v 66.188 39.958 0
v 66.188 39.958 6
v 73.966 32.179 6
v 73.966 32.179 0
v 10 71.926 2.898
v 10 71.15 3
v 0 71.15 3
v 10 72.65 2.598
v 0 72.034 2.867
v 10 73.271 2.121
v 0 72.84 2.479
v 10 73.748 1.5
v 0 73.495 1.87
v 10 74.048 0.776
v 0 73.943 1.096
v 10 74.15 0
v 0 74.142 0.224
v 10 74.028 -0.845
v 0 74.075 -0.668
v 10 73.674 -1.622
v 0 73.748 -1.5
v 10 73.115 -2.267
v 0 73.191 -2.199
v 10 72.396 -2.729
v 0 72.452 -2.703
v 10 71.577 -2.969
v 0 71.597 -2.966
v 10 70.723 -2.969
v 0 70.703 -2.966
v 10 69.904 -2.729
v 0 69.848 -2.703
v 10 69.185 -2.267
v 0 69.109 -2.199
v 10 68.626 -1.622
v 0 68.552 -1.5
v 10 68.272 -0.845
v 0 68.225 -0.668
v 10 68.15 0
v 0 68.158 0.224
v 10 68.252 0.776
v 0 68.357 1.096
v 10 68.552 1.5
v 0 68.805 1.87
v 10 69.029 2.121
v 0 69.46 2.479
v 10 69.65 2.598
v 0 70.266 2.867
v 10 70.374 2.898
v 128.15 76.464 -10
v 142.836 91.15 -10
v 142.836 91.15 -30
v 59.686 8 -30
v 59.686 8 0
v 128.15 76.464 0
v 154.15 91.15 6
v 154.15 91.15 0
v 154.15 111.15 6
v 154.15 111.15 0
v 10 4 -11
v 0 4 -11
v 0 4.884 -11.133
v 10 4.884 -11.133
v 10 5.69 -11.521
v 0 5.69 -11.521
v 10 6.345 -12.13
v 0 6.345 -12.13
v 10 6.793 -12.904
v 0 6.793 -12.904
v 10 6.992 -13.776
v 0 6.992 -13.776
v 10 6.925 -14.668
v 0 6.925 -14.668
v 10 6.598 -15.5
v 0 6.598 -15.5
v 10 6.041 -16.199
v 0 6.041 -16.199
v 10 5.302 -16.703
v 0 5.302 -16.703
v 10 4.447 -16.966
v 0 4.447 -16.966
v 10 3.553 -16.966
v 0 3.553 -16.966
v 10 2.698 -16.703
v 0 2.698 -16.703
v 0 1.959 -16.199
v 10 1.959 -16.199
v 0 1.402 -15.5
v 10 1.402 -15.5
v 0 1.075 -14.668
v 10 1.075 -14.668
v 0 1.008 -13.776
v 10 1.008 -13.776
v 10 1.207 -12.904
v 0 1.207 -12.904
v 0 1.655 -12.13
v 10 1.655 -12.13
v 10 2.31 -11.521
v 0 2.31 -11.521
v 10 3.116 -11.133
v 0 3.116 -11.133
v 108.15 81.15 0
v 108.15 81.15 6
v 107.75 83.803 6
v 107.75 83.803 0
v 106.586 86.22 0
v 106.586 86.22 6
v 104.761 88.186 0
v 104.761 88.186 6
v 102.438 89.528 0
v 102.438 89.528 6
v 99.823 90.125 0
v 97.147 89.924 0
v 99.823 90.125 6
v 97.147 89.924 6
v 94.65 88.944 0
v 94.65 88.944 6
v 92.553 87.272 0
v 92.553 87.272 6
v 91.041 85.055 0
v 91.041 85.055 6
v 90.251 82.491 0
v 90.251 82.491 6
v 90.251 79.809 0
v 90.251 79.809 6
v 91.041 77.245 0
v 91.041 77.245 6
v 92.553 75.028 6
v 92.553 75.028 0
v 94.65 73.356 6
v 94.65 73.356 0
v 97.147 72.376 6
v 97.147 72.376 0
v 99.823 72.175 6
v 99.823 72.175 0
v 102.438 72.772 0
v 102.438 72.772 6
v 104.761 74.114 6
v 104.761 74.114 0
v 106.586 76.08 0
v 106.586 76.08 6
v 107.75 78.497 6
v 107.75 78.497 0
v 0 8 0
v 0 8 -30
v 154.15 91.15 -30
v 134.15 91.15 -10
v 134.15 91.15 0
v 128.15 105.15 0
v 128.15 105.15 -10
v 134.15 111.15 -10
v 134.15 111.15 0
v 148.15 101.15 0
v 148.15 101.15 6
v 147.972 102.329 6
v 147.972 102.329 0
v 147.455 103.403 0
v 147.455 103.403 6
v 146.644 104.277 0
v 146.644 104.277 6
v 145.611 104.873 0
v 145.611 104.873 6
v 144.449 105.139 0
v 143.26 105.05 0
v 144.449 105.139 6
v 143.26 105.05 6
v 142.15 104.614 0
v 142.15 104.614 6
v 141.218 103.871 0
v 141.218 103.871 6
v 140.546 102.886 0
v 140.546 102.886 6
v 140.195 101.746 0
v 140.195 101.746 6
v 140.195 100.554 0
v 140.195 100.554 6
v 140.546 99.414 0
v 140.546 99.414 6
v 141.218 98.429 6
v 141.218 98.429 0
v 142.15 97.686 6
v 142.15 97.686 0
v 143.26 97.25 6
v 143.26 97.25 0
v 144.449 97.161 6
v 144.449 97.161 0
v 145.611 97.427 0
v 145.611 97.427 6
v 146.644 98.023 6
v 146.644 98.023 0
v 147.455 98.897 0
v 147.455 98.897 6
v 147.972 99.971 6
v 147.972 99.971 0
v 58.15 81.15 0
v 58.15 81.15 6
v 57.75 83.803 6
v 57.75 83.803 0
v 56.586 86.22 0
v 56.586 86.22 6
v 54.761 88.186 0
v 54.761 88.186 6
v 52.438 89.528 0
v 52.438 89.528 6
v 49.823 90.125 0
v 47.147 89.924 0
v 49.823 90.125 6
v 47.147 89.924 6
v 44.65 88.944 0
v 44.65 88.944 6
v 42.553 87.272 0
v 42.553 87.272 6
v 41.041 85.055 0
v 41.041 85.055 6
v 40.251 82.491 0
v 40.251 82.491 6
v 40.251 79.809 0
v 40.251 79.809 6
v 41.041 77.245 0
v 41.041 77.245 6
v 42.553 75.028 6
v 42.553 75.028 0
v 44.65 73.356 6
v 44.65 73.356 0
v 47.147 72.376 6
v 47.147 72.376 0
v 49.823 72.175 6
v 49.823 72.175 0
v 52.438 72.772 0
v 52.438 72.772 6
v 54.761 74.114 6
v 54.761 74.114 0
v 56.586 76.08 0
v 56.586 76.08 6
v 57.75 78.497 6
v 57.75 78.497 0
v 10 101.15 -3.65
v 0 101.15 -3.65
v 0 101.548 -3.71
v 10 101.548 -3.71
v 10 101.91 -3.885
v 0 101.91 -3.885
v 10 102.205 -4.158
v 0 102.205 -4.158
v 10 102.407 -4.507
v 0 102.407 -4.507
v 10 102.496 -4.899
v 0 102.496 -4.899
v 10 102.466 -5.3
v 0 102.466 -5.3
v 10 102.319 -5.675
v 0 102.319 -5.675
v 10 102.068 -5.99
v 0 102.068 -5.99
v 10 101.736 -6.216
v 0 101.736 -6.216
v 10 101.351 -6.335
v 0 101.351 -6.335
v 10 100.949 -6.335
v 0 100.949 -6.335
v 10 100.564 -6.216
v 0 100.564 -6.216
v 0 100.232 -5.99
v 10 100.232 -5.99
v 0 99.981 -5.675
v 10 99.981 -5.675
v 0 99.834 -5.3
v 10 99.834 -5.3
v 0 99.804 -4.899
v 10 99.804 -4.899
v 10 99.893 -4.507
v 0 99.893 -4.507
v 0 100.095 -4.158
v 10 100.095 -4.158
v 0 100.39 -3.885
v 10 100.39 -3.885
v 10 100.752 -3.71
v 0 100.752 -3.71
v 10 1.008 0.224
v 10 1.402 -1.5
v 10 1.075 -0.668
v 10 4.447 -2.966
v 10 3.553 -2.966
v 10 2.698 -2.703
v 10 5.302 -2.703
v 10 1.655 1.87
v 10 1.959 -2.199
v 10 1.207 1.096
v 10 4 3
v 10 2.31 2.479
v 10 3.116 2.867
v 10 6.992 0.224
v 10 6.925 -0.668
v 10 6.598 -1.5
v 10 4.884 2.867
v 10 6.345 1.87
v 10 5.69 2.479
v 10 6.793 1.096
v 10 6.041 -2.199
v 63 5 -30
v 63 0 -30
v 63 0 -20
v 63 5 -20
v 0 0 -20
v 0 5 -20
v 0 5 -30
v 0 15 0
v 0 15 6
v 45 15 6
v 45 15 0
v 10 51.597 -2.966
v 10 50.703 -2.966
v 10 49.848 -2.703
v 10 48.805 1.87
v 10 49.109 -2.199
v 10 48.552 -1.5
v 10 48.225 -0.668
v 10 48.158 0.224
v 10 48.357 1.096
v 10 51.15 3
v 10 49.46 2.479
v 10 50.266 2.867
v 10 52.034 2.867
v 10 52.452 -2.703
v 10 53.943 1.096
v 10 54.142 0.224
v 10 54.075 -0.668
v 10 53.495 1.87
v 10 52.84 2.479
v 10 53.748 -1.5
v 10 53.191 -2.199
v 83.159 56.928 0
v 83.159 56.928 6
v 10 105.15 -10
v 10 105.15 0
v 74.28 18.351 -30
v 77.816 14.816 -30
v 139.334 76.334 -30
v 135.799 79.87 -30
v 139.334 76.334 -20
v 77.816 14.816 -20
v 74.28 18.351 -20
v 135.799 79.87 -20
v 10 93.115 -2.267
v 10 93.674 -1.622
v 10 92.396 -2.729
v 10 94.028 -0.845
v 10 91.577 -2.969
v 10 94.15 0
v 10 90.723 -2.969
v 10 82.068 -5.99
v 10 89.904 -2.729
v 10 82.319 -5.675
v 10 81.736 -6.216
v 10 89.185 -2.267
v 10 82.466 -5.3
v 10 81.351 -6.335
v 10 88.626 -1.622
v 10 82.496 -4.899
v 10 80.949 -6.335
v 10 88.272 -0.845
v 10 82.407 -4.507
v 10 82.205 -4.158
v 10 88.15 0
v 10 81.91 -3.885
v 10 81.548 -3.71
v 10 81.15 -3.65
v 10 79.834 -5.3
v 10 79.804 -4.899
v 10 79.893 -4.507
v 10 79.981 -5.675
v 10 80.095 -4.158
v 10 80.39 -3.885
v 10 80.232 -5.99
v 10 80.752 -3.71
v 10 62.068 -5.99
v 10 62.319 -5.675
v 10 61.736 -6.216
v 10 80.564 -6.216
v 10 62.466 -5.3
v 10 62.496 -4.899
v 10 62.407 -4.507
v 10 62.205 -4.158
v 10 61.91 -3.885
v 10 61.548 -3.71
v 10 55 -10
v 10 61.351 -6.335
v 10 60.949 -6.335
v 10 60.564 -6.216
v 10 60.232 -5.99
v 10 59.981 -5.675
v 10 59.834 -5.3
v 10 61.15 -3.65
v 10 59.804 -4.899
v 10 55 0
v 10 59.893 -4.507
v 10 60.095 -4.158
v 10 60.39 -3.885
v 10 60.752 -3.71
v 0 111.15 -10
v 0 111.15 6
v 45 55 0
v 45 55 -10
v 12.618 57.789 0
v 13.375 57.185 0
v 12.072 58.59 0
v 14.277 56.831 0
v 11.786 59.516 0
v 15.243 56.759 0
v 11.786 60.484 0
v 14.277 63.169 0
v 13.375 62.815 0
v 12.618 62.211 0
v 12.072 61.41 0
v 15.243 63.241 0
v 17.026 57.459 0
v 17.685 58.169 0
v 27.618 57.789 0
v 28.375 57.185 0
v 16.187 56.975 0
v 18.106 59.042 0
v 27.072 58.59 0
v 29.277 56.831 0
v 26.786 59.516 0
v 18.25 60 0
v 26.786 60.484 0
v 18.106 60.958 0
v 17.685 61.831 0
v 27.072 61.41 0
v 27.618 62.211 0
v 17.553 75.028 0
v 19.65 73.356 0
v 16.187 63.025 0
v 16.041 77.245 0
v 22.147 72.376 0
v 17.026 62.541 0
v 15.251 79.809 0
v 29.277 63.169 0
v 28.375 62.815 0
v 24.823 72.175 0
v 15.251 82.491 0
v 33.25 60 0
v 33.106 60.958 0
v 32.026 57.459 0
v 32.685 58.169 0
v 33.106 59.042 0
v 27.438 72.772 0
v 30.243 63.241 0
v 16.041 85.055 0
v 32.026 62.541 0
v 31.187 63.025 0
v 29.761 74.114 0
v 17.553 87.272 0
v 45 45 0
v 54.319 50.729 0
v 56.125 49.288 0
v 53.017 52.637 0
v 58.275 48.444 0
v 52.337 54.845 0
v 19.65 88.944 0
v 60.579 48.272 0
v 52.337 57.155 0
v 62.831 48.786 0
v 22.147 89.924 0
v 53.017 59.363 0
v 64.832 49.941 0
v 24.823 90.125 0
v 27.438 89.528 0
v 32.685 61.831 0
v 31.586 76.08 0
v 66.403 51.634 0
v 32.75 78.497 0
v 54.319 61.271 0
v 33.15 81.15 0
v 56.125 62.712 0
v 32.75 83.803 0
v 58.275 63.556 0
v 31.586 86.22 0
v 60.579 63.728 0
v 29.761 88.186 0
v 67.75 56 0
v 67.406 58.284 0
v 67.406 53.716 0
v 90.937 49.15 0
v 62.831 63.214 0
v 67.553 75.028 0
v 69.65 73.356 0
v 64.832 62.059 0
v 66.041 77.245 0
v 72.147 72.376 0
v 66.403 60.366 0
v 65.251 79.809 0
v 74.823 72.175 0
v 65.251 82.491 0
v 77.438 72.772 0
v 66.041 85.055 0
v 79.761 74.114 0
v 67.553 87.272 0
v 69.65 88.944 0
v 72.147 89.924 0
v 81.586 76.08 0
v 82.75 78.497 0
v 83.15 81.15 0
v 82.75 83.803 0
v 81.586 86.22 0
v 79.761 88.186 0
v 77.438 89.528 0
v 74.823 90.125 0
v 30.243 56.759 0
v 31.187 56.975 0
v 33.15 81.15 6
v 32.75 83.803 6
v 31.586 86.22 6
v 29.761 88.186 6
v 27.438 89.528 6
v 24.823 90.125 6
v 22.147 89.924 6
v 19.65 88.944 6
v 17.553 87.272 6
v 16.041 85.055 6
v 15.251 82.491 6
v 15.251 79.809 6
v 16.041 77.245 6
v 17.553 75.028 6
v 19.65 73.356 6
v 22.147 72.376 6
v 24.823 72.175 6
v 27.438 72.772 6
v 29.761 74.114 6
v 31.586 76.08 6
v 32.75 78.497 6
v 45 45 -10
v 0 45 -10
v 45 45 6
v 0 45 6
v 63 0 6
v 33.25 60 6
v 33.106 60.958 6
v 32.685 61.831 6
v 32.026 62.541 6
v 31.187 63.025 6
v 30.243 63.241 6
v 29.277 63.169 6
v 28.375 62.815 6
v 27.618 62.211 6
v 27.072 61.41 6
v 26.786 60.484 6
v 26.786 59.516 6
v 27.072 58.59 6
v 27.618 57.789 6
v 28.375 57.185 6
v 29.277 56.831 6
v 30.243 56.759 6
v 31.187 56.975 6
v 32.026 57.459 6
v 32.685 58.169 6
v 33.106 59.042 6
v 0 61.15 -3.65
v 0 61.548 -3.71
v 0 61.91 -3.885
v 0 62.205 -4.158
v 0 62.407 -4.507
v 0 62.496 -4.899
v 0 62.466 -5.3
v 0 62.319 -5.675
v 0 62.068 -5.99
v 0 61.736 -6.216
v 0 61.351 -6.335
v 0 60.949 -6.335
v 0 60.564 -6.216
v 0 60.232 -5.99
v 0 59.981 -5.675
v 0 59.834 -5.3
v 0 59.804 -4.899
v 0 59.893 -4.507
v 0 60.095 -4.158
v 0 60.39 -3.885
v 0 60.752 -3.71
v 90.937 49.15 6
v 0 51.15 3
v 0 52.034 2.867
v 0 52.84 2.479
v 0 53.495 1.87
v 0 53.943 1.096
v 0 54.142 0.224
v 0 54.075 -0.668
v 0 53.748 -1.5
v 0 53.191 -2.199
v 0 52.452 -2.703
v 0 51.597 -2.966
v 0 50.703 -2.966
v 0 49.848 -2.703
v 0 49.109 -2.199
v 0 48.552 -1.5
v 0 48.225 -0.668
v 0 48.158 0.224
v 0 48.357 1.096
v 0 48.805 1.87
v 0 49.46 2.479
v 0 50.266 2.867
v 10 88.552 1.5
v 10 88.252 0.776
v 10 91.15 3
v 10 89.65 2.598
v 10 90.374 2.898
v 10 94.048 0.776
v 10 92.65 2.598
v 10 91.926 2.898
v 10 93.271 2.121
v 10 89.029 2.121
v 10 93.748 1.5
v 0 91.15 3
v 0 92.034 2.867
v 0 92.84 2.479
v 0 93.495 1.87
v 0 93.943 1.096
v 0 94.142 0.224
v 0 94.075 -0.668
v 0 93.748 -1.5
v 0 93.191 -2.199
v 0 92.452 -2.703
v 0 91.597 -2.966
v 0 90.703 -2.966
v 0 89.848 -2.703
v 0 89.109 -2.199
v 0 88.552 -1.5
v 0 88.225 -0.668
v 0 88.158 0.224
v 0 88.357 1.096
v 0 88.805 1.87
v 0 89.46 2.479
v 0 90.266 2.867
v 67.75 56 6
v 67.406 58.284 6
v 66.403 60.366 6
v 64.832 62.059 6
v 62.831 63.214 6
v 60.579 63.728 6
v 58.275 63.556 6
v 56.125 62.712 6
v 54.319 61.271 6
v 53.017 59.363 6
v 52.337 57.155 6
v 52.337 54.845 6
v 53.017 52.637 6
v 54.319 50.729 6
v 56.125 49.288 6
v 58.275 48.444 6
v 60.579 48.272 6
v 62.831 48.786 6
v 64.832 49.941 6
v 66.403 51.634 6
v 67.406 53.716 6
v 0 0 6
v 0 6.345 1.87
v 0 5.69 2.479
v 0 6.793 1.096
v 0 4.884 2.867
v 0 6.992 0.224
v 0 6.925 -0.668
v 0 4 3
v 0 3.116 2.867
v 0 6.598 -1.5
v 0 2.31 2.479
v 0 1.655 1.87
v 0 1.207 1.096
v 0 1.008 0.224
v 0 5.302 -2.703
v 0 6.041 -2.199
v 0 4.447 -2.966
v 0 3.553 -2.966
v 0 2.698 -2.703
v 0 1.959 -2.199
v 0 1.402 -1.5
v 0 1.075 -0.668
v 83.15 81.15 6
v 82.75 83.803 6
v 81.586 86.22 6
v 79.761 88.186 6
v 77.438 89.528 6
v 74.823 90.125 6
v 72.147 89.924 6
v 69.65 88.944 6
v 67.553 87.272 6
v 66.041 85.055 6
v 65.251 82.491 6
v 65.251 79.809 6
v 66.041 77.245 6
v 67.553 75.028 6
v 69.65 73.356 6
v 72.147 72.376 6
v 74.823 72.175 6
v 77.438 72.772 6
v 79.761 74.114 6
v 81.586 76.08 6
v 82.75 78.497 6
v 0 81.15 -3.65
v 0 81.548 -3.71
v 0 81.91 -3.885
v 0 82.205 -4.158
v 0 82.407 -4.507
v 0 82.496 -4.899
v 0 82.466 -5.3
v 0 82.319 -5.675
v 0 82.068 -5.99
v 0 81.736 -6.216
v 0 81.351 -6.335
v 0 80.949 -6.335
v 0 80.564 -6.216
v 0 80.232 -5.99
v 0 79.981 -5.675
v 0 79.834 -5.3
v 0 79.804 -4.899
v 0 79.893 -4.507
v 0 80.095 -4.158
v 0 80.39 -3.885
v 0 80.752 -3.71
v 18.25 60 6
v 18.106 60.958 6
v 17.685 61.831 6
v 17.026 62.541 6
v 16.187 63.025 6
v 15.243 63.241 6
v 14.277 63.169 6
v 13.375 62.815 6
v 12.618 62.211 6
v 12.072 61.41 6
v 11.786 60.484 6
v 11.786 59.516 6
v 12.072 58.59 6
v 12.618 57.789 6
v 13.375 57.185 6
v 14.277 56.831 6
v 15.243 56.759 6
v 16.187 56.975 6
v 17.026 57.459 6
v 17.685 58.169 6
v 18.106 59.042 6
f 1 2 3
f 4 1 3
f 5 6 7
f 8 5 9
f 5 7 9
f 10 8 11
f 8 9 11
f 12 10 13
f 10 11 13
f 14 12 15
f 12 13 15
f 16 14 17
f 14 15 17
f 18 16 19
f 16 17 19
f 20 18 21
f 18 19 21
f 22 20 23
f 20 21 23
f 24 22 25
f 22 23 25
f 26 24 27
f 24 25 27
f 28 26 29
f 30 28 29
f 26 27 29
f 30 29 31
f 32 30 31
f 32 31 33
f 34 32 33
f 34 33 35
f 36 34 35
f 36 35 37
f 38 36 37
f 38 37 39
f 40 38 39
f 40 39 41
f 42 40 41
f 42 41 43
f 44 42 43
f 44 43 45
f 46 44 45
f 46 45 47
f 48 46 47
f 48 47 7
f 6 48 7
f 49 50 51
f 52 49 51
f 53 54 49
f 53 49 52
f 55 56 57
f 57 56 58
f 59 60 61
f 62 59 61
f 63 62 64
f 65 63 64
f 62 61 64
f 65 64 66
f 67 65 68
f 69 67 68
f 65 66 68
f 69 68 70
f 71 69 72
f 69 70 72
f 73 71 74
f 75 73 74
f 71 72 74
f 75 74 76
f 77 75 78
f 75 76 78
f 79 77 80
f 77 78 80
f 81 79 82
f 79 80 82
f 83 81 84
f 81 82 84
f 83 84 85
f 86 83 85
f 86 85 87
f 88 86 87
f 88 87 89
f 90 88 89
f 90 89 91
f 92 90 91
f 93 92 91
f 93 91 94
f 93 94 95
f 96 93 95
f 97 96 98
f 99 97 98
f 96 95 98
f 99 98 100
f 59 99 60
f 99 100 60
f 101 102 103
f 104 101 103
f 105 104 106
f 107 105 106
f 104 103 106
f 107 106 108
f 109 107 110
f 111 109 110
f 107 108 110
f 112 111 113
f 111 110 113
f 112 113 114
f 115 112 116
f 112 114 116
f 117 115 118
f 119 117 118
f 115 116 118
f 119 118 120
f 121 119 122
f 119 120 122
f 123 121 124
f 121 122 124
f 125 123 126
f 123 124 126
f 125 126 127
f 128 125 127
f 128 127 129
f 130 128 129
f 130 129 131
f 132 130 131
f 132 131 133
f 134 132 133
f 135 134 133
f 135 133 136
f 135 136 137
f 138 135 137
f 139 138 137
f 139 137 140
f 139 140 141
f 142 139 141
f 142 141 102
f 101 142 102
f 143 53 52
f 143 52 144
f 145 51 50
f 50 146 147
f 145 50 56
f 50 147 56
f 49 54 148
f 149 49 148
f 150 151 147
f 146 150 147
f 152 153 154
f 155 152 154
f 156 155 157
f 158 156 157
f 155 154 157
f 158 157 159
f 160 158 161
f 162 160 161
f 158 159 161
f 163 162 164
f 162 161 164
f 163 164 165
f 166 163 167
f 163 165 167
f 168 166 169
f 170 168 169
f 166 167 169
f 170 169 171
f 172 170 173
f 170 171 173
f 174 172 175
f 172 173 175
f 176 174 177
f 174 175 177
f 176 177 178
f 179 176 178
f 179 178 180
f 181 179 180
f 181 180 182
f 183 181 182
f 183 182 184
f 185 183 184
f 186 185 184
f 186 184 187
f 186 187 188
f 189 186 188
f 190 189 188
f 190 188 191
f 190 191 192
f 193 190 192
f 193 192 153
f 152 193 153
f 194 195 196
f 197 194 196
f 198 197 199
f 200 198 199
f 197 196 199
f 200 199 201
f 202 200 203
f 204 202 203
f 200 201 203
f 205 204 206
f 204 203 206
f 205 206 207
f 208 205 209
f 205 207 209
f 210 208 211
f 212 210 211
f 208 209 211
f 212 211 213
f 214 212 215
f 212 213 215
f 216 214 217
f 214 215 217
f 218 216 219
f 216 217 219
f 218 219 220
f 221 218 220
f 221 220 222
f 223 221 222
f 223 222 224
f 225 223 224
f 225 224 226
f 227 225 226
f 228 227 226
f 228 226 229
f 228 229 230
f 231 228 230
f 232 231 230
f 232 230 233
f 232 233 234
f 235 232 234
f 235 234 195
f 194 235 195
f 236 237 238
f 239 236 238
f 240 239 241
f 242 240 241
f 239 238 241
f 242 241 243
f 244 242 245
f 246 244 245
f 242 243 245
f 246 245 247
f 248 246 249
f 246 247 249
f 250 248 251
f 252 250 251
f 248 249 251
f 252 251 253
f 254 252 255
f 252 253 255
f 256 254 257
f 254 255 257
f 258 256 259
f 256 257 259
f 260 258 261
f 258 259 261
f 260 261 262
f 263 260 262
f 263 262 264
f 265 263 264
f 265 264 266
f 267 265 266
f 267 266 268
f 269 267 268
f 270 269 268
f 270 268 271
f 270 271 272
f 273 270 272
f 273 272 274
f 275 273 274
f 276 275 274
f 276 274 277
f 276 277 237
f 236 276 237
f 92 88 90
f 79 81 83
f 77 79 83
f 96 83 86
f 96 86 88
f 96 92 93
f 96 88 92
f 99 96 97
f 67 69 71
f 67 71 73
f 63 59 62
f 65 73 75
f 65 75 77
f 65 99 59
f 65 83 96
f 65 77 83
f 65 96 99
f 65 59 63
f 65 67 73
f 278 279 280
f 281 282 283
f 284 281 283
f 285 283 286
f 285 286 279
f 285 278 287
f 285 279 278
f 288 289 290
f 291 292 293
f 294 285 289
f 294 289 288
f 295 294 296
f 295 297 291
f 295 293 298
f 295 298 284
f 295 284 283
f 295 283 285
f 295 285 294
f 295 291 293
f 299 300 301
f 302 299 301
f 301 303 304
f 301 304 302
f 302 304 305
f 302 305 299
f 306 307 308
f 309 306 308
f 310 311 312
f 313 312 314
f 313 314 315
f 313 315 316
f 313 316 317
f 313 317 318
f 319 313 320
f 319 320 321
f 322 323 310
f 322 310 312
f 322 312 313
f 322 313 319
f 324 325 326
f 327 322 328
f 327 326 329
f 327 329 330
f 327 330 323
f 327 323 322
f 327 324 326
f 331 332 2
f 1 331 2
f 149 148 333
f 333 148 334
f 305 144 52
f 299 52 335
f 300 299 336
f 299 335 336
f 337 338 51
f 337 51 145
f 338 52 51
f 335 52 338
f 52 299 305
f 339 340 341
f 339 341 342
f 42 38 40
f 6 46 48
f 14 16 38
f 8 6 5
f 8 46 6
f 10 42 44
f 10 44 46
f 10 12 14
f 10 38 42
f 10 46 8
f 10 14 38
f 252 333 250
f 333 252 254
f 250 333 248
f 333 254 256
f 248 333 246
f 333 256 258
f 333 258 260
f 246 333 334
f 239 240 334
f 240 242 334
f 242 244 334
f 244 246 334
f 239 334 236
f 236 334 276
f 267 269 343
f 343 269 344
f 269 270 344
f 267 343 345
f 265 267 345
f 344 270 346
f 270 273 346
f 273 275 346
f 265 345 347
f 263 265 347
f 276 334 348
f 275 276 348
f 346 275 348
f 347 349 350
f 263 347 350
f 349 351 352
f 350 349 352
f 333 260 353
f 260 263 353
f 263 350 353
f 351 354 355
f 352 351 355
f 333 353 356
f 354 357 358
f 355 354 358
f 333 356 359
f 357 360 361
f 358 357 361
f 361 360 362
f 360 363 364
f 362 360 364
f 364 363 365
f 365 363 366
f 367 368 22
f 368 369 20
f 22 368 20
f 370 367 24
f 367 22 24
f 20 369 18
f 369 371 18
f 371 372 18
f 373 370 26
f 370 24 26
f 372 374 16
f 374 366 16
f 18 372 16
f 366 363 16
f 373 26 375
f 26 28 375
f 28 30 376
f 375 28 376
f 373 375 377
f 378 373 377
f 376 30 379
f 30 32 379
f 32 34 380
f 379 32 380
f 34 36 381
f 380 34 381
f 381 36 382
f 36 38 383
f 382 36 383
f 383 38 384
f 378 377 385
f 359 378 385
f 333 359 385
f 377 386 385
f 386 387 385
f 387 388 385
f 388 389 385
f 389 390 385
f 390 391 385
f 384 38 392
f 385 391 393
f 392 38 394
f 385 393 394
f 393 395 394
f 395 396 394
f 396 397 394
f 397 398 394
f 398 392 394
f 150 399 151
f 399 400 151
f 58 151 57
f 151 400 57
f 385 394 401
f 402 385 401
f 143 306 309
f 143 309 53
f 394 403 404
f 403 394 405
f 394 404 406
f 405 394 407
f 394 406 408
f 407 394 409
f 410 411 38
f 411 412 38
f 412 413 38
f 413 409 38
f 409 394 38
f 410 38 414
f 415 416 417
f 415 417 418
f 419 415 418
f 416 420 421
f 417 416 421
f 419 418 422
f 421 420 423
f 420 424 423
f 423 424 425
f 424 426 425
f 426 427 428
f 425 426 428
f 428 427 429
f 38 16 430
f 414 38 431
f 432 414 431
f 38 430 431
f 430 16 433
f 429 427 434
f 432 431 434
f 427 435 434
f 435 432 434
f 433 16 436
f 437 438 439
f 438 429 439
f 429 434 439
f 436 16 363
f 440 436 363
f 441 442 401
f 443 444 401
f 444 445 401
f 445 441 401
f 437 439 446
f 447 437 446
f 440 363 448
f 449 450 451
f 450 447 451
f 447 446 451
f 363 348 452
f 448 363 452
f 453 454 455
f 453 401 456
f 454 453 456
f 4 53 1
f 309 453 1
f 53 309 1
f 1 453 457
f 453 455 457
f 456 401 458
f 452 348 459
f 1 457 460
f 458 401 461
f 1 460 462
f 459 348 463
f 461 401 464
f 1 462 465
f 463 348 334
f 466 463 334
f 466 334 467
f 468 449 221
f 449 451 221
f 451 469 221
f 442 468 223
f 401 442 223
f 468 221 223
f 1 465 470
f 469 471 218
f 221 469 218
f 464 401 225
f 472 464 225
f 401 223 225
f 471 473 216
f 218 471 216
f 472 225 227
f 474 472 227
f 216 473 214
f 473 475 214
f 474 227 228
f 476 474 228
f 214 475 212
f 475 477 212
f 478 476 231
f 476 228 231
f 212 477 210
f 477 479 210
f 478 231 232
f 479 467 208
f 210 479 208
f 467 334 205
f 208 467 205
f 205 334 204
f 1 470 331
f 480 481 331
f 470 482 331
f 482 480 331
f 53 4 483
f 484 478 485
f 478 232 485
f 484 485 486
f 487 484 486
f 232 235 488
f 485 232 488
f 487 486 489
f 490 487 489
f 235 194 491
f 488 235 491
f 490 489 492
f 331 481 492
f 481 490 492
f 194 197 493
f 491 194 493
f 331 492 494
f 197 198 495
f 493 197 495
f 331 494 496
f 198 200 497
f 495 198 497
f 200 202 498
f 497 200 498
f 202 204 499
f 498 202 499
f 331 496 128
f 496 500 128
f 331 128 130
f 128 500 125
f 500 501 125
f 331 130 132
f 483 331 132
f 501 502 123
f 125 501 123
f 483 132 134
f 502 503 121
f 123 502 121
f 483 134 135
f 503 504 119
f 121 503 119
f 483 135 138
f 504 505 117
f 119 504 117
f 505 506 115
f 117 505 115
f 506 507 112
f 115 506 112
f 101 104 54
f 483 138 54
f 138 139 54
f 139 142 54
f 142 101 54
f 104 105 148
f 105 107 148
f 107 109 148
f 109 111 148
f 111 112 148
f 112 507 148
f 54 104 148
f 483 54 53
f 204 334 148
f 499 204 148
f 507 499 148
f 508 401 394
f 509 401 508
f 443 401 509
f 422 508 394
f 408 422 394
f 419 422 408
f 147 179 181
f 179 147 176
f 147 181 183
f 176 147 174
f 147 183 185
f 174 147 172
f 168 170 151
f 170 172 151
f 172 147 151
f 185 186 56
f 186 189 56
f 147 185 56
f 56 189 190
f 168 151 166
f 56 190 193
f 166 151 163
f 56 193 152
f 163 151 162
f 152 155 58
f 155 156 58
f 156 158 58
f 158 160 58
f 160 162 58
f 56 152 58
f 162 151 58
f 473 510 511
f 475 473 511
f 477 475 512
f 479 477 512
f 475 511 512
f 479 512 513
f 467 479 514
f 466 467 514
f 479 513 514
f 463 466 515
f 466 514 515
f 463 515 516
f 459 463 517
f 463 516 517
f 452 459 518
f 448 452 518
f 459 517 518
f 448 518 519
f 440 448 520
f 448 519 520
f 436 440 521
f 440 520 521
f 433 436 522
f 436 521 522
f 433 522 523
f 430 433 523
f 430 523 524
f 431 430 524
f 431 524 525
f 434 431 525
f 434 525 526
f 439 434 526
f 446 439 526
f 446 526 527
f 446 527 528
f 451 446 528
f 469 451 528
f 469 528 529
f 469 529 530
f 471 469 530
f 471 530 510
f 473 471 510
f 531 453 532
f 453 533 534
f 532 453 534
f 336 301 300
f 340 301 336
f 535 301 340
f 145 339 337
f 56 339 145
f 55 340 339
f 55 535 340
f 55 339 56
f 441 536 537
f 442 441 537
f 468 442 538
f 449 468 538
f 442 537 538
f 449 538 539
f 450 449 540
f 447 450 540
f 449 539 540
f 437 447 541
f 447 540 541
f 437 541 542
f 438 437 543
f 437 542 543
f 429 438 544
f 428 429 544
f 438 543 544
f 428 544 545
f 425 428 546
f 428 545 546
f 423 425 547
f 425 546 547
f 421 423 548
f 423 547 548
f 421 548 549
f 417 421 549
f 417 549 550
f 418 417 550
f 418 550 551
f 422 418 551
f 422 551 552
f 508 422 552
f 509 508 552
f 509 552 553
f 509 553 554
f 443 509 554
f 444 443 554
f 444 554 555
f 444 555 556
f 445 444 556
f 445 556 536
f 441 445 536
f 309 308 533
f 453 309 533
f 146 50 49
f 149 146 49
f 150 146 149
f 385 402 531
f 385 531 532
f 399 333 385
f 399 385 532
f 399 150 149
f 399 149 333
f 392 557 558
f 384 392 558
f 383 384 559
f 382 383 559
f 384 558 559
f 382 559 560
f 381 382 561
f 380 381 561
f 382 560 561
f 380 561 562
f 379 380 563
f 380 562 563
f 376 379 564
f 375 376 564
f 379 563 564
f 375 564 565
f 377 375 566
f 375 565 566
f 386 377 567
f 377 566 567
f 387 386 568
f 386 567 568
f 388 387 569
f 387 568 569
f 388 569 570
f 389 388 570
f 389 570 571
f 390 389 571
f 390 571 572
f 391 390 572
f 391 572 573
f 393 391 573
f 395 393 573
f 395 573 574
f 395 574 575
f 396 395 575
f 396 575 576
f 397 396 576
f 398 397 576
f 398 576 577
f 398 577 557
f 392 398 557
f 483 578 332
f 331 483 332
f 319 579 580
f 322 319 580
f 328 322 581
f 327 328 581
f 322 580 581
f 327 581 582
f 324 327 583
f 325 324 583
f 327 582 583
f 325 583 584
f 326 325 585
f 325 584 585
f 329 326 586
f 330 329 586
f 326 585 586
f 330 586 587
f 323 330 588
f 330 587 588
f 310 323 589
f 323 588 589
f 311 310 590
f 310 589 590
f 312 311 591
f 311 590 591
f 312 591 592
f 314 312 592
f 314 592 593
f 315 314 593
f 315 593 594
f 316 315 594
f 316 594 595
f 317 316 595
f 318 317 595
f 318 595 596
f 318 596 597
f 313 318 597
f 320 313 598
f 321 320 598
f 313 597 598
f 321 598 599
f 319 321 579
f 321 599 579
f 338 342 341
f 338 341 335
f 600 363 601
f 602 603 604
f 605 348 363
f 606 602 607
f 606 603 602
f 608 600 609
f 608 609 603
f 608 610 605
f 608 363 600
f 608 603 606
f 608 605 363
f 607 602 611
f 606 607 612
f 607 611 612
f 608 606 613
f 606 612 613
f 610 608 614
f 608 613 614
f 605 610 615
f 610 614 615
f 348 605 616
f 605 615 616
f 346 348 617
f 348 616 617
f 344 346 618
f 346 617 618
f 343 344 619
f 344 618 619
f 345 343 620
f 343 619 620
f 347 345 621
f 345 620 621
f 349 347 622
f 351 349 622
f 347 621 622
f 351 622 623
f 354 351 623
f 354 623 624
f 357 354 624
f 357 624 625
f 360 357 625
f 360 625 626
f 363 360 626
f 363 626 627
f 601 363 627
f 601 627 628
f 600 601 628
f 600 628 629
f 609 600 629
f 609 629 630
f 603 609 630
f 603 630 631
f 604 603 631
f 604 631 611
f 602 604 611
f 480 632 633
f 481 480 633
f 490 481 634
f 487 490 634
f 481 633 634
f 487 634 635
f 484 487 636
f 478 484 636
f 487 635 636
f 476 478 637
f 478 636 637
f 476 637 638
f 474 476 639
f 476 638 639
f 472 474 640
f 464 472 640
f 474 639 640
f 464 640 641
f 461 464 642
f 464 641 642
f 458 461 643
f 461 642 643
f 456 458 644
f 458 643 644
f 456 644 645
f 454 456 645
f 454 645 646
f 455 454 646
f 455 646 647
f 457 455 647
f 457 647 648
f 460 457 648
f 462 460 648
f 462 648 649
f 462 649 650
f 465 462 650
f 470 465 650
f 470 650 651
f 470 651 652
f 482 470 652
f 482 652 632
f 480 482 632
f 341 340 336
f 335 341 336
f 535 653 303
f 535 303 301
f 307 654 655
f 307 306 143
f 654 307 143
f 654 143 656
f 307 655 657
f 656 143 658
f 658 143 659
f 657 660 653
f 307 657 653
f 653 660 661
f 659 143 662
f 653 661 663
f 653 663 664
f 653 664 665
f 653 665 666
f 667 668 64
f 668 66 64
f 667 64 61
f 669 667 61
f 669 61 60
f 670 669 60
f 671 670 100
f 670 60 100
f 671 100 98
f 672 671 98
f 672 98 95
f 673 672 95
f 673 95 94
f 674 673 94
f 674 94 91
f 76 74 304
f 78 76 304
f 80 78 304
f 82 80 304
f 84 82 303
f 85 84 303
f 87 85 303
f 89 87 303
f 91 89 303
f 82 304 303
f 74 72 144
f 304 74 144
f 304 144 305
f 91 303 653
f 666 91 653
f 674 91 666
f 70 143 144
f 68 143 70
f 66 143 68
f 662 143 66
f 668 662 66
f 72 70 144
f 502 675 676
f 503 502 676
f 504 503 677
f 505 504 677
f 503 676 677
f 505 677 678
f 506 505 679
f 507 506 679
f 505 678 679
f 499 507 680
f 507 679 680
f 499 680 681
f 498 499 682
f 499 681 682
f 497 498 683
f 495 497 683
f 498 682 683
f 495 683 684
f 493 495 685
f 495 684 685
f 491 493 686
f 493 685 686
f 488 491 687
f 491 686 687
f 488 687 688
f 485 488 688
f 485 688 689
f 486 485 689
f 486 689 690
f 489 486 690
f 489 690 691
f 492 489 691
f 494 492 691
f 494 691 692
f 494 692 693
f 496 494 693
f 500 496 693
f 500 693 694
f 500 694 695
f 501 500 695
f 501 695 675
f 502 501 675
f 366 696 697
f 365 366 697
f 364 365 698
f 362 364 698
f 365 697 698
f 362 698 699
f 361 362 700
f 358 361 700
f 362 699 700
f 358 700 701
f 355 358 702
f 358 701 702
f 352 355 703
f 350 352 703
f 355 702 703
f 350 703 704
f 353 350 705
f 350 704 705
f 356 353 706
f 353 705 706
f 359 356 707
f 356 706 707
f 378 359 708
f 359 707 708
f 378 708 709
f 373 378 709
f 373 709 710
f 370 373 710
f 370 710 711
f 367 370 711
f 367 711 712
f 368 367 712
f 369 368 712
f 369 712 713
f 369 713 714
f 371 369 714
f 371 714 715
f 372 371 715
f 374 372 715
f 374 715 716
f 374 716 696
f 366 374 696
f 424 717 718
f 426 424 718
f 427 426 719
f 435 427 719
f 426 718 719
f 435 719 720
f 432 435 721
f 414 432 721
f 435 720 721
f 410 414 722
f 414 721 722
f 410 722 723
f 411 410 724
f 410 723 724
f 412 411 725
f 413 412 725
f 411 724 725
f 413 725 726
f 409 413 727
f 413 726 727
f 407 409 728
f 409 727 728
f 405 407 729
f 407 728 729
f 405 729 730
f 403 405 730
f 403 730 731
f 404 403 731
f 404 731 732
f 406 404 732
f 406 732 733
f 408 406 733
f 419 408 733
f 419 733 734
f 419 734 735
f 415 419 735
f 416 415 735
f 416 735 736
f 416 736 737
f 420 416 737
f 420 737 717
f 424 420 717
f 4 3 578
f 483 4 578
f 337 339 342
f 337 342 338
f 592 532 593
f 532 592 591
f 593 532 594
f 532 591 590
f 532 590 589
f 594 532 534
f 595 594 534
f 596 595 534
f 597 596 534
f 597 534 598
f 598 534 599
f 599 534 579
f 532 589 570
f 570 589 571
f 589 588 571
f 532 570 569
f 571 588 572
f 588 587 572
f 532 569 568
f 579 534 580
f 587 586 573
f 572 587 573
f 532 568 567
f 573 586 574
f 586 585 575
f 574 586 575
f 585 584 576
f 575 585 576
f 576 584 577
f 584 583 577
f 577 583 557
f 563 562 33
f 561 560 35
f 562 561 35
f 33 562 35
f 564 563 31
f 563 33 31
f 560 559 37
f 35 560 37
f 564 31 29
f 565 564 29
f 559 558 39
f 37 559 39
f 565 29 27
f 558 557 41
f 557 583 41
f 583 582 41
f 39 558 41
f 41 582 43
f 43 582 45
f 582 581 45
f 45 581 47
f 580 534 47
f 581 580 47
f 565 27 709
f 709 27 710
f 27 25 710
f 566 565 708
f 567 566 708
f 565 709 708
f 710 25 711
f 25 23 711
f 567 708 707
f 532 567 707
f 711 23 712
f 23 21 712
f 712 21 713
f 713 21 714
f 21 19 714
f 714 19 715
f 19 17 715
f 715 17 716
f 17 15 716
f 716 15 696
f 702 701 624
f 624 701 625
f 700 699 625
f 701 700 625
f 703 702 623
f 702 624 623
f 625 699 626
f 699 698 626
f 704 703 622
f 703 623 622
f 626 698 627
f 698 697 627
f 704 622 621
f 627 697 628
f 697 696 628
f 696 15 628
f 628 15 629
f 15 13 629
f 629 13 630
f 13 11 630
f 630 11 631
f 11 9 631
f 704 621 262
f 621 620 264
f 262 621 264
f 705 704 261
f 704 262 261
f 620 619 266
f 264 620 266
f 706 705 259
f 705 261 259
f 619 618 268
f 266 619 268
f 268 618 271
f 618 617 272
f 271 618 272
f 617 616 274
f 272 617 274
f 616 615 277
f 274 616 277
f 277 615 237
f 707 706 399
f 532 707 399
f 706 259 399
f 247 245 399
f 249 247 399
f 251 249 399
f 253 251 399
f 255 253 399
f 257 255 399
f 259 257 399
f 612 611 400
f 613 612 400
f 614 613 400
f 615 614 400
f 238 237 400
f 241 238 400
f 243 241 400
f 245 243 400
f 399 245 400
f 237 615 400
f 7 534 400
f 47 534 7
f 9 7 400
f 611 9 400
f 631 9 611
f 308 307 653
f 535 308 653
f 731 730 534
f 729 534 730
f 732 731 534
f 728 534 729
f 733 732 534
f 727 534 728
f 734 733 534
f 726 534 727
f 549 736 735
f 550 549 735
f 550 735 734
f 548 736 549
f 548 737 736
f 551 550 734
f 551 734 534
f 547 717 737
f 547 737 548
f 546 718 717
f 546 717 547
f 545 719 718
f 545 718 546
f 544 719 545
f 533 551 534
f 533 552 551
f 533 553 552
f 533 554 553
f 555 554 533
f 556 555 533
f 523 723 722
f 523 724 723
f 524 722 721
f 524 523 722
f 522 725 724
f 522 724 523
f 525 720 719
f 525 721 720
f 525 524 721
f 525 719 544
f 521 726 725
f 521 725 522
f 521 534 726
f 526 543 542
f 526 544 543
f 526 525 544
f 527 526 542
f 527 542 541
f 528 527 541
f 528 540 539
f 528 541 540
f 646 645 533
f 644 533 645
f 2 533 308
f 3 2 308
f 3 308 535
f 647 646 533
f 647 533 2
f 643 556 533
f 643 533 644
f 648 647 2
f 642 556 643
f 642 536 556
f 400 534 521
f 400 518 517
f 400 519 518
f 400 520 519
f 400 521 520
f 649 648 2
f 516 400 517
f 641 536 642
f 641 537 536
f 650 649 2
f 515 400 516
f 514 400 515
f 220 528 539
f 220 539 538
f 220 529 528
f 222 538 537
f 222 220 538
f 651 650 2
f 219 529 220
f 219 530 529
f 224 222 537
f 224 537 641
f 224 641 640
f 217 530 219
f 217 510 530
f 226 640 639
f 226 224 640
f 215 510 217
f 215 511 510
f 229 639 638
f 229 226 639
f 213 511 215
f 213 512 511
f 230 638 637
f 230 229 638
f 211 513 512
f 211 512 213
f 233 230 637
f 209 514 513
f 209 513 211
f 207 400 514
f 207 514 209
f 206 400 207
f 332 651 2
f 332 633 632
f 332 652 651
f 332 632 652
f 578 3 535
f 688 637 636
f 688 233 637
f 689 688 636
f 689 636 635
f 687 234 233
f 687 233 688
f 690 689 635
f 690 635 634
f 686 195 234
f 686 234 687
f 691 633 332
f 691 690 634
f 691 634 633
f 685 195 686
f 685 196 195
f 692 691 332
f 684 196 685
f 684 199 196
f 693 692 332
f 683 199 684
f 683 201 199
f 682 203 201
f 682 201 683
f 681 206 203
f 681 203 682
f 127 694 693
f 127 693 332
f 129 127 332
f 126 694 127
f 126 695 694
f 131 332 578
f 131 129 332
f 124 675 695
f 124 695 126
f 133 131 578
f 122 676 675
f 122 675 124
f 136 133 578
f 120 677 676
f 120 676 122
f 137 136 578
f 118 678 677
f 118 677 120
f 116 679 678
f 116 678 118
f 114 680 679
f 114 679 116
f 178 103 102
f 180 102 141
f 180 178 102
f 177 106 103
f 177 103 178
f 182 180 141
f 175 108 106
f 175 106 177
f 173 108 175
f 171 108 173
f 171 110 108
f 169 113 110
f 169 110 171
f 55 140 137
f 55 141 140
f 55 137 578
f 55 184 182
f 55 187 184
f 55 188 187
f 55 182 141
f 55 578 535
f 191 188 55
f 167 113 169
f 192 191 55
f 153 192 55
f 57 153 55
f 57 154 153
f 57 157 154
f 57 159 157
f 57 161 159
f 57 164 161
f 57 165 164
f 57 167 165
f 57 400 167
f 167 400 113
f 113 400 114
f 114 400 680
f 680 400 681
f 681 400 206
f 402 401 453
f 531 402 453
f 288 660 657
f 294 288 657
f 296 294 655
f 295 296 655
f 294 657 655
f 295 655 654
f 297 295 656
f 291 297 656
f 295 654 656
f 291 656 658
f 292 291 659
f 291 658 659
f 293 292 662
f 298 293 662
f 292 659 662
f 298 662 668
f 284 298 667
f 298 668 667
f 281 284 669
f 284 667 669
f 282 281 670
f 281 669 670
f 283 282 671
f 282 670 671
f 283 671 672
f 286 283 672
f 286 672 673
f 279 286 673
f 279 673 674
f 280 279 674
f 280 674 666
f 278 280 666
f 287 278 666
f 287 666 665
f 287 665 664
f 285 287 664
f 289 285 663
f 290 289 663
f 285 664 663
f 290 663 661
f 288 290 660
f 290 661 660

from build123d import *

# Parameters (mm, degrees)
BOSS_EXTRU_1_DEPTH         = 6
ESQUISSE2_R                = 9
ESQUISSE2_R_2              = 7.75
ESQUISSE2_R_3              = 3.25
ENL_V_MAT_EXTRU_1_DEPTH    = 191.138226036
ESQUISSE3_W                = 45
ESQUISSE3_H                = 30
ENL_V_MAT_EXTRU_2_DEPTH    = 191.138226036
BOSS_EXTRU_2_DEPTH         = 30
BOSS_EXTRU_3_DEPTH         = 10
ESQUISSE8_R                = 4
ENL_V_MAT_EXTRU_3_DEPTH    = 194.423227664
ENL_V_MAT_EXTRU_4_REACH    = 194.397
ESQUISSE9_R                = 1.35
R_P_TITION_LIN_AIRE1_COUNT = 3
R_P_TITION_LIN_AIRE1_PITCH = 20
ESQUISSE10_R               = 3
ENL_V_MAT_EXTRU_5_DEPTH    = 10
ESQUISSE11_W               = 63
ESQUISSE11_H               = 10
ENL_V_MAT_EXTRU_6_DEPTH    = 5
ESQUISSE12_W               = 10
ESQUISSE12_H               = 87
ENL_V_MAT_EXTRU_7_DEPTH    = 5


with BuildPart() as part:
    # Esquisse1 → Boss.-Extru.1 (new body)
    with BuildSketch(Plane.XY):
        Polygon((0, 0), (63, 0), (154.15, 91.15), (154.15, 111.15), (0, 111.15), align=None)
    extrude(amount=BOSS_EXTRU_1_DEPTH)

    # Esquisse2 → Enlèv. mat.-Extru.1 (cut, through all)
    with BuildSketch(Plane.XY.offset(6)):
        with Locations((49.149999599, 81.15)):
            Circle(ESQUISSE2_R)
        with Locations((74.15, 81.15)):
            Circle(ESQUISSE2_R)
        with Locations((99.15, 81.15)):
            Circle(ESQUISSE2_R)
        with Locations((24.149999599, 81.15)):
            Circle(ESQUISSE2_R)
        with Locations((60, 56)):
            Circle(ESQUISSE2_R_2)
        with Locations((30, 60)):
            Circle(ESQUISSE2_R_3)
        with Locations((15, 60)):
            Circle(ESQUISSE2_R_3)
        Polygon((66.188059223, 39.957611845), (73.966233816, 32.179437252), (90.936796564, 49.15), (83.158621971, 56.928174593), align=None)
    extrude(amount=-ENL_V_MAT_EXTRU_1_DEPTH, mode=Mode.SUBTRACT)

    # Esquisse3 → Enlèv. mat.-Extru.2 (cut, through all)
    with BuildSketch(Plane.XY.offset(6)):
        with Locations((22.5, 30)):
            Rectangle(ESQUISSE3_W, ESQUISSE3_H)
    extrude(amount=-ENL_V_MAT_EXTRU_2_DEPTH, mode=Mode.SUBTRACT)

    # Esquisse6 → Boss.-Extru.2 (add)
    with BuildSketch(Plane(origin=(0, 0, 0), x_dir=(-1, 0, 0), z_dir=(0, 0, -1))):
        Polygon((-154.15, 91.15), (-142.836291501, 91.15), (-59.686291501, 8), (0, 8), (0, 0), (-63, 0), align=None)
    extrude(amount=BOSS_EXTRU_2_DEPTH)

    # Esquisse7 → Boss.-Extru.3 (add)
    with BuildSketch(Plane(origin=(0, 0, 0), x_dir=(-1, 0, 0), z_dir=(0, 0, -1))):
        Polygon((-10, 55), (-45, 55), (-45, 45), (0, 45), (0, 111.15), (-134.15, 111.15), (-134.15, 91.15), (-142.836291501, 91.15), (-128.15, 76.463708499), (-128.15, 105.15), (-10, 105.15), align=None)
    extrude(amount=BOSS_EXTRU_3_DEPTH)

    # Esquisse8 → Enlèv. mat.-Extru.3 (cut, through all)
    with BuildSketch(Plane.XY.offset(6)):
        with Locations((144.15, 101.15)):
            Circle(ESQUISSE8_R)
    extrude(amount=-ENL_V_MAT_EXTRU_3_DEPTH, mode=Mode.SUBTRACT)

    # Esquisse9 → Enlèv. mat.-Extru.4 (cut, up to next)
    with BuildSketch(Plane.ZY, mode=Mode.PRIVATE) as enl_v_mat_extru_4_sk1:
        with Locations((-5, 101.15)):
            Circle(ESQUISSE9_R)
    enl_v_mat_extru_4_tool1 = extrude(enl_v_mat_extru_4_sk1.sketch, amount=-ENL_V_MAT_EXTRU_4_REACH, mode=Mode.PRIVATE) & part.part
    enl_v_mat_extru_4 = enl_v_mat_extru_4_tool1.solids().sort_by_distance((0, 101.15, -5))[0]
    add(enl_v_mat_extru_4, mode=Mode.SUBTRACT)

    # Répétition linéaire1: Enlèv. mat.-Extru.4 ×3
    with Locations(*[(0, -i * R_P_TITION_LIN_AIRE1_PITCH, 0) for i in range(1, R_P_TITION_LIN_AIRE1_COUNT)]):
        add(enl_v_mat_extru_4, mode=Mode.SUBTRACT)

    # Esquisse10 → Enlèv. mat.-Extru.5 (cut)
    with BuildSketch(Plane.ZY):
        with Locations((0, 91.15)):
            Circle(ESQUISSE10_R)
        with Locations((0, 71.15)):
            Circle(ESQUISSE10_R)
        with Locations((0, 51.15)):
            Circle(ESQUISSE10_R)
        with Locations((-14, 4)):
            Circle(ESQUISSE10_R)
        with Locations((0, 4)):
            Circle(ESQUISSE10_R)
    extrude(amount=-ENL_V_MAT_EXTRU_5_DEPTH, mode=Mode.SUBTRACT)

    # Esquisse11 → Enlèv. mat.-Extru.6 (cut)
    with BuildSketch(Plane.XZ):
        with Locations((31.5, -25)):
            Rectangle(ESQUISSE11_W, ESQUISSE11_H)
    extrude(amount=-ENL_V_MAT_EXTRU_6_DEPTH, mode=Mode.SUBTRACT)

    # Esquisse12 → Enlèv. mat.-Extru.7 (cut)
    with BuildSketch(Plane(origin=(31.5, -31.5, 0), x_dir=(0, 0, -1), z_dir=(0.7071067811865489, -0.7071067811865462, 0))):
        with Locations((25, 109.00051032)):
            Rectangle(ESQUISSE12_W, ESQUISSE12_H)
    extrude(amount=-ENL_V_MAT_EXTRU_7_DEPTH, mode=Mode.SUBTRACT)


solid = part.part
